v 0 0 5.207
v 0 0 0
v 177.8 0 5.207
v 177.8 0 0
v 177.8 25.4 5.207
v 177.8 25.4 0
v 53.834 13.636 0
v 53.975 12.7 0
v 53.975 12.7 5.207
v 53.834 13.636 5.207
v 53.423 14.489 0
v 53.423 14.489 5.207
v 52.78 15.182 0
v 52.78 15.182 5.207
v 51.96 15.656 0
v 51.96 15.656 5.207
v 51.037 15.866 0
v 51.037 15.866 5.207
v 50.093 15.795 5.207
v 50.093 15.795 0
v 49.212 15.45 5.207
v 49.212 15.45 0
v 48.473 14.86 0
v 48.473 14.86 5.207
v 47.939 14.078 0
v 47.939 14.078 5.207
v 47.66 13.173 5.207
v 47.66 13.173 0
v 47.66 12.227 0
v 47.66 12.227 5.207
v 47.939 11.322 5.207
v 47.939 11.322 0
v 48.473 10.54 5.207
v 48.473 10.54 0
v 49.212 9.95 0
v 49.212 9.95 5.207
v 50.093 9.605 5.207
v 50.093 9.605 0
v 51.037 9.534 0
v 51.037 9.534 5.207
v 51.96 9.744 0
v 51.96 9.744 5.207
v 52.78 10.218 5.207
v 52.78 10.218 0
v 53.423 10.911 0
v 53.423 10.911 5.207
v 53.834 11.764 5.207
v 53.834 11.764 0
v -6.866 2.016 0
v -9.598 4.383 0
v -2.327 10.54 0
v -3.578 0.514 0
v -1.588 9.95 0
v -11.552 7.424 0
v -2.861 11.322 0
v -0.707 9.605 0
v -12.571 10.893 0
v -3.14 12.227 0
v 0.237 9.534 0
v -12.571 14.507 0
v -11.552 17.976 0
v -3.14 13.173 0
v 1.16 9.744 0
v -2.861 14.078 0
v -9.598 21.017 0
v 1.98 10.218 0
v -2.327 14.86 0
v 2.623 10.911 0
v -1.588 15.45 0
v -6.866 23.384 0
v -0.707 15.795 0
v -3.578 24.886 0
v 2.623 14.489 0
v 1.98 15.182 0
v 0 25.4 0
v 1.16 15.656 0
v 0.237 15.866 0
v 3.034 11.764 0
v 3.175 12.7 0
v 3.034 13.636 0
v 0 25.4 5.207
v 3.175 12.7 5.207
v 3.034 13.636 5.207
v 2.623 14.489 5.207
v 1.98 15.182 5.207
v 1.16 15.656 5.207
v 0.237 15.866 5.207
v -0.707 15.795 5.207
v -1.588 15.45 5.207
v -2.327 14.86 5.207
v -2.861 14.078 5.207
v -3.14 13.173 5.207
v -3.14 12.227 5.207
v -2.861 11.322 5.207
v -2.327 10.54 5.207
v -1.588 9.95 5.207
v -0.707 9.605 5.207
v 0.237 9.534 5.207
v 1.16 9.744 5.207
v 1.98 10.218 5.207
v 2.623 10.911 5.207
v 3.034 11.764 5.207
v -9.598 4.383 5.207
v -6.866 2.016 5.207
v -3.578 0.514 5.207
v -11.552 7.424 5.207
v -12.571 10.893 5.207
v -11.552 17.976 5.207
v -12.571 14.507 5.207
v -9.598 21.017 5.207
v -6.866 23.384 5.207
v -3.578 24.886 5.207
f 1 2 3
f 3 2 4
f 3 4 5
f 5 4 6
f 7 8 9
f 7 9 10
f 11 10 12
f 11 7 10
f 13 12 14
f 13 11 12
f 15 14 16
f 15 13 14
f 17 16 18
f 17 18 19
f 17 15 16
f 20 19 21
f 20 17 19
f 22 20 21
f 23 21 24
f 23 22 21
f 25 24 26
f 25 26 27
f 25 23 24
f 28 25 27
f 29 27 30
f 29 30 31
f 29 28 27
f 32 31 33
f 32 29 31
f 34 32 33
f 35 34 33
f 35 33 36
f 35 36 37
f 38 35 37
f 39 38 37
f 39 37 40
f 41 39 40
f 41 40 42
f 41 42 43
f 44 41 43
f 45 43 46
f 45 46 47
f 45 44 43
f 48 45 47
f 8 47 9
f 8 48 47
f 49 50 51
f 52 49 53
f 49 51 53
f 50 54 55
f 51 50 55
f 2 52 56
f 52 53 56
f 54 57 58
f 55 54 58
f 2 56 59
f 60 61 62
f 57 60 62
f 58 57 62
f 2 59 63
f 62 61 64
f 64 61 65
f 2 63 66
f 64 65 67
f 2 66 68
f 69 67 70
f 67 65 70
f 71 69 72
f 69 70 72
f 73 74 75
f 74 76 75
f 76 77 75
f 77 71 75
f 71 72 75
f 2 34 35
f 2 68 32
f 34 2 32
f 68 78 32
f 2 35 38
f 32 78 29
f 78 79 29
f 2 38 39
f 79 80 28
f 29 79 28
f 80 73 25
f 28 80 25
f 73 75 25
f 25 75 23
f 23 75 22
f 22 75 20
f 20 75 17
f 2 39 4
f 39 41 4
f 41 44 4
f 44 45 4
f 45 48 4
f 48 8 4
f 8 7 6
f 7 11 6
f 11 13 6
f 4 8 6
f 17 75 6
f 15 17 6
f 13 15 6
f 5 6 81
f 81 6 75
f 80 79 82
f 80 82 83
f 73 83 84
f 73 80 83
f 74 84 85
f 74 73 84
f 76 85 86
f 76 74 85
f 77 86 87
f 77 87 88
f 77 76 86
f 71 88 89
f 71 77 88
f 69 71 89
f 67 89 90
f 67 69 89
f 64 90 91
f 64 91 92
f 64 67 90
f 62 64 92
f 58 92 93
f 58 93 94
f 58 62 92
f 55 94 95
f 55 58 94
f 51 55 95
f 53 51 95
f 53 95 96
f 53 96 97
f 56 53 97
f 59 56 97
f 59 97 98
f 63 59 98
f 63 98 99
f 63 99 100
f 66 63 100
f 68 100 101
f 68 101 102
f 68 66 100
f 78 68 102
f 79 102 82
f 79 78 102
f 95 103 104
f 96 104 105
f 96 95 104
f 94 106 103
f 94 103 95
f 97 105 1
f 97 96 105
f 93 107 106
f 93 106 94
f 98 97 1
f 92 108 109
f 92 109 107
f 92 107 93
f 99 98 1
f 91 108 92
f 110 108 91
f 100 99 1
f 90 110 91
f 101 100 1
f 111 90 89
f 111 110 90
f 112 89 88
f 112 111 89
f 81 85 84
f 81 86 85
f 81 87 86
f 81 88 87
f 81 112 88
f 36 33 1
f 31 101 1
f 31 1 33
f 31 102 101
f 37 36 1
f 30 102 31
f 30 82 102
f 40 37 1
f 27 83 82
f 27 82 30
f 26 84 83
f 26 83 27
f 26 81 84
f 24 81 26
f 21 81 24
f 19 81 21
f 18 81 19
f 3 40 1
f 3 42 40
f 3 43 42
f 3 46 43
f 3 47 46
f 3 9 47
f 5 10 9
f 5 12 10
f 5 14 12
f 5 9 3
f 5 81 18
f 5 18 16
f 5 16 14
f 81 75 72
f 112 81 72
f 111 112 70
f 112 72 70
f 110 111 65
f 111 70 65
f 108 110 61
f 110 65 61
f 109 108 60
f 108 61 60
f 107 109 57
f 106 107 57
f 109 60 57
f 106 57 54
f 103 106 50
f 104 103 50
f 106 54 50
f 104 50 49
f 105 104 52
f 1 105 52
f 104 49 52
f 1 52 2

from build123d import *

# Parameters (mm, degrees)
SKETCH2_R           = 3.175
BOSS_EXTRUDE2_DEPTH = 5.207


with BuildPart() as part:
    # Sketch2 → Boss-Extrude2 (new body)
    with BuildSketch(Plane.XY):
        with BuildLine():
            Line((0, 0), (177.8, 0))
            Line((177.8, 0), (177.8, 25.4))
            Line((177.8, 25.4), (0, 25.4))
            ThreePointArc((0, 25.4), (-12.7, 12.7), (0, 0))
        make_face()
        with Locations((0, 12.7)):
            Circle(SKETCH2_R, mode=Mode.SUBTRACT)
        with Locations((50.8, 12.7)):
            Circle(SKETCH2_R, mode=Mode.SUBTRACT)
    extrude(amount=BOSS_EXTRUDE2_DEPTH)


solid = part.part
